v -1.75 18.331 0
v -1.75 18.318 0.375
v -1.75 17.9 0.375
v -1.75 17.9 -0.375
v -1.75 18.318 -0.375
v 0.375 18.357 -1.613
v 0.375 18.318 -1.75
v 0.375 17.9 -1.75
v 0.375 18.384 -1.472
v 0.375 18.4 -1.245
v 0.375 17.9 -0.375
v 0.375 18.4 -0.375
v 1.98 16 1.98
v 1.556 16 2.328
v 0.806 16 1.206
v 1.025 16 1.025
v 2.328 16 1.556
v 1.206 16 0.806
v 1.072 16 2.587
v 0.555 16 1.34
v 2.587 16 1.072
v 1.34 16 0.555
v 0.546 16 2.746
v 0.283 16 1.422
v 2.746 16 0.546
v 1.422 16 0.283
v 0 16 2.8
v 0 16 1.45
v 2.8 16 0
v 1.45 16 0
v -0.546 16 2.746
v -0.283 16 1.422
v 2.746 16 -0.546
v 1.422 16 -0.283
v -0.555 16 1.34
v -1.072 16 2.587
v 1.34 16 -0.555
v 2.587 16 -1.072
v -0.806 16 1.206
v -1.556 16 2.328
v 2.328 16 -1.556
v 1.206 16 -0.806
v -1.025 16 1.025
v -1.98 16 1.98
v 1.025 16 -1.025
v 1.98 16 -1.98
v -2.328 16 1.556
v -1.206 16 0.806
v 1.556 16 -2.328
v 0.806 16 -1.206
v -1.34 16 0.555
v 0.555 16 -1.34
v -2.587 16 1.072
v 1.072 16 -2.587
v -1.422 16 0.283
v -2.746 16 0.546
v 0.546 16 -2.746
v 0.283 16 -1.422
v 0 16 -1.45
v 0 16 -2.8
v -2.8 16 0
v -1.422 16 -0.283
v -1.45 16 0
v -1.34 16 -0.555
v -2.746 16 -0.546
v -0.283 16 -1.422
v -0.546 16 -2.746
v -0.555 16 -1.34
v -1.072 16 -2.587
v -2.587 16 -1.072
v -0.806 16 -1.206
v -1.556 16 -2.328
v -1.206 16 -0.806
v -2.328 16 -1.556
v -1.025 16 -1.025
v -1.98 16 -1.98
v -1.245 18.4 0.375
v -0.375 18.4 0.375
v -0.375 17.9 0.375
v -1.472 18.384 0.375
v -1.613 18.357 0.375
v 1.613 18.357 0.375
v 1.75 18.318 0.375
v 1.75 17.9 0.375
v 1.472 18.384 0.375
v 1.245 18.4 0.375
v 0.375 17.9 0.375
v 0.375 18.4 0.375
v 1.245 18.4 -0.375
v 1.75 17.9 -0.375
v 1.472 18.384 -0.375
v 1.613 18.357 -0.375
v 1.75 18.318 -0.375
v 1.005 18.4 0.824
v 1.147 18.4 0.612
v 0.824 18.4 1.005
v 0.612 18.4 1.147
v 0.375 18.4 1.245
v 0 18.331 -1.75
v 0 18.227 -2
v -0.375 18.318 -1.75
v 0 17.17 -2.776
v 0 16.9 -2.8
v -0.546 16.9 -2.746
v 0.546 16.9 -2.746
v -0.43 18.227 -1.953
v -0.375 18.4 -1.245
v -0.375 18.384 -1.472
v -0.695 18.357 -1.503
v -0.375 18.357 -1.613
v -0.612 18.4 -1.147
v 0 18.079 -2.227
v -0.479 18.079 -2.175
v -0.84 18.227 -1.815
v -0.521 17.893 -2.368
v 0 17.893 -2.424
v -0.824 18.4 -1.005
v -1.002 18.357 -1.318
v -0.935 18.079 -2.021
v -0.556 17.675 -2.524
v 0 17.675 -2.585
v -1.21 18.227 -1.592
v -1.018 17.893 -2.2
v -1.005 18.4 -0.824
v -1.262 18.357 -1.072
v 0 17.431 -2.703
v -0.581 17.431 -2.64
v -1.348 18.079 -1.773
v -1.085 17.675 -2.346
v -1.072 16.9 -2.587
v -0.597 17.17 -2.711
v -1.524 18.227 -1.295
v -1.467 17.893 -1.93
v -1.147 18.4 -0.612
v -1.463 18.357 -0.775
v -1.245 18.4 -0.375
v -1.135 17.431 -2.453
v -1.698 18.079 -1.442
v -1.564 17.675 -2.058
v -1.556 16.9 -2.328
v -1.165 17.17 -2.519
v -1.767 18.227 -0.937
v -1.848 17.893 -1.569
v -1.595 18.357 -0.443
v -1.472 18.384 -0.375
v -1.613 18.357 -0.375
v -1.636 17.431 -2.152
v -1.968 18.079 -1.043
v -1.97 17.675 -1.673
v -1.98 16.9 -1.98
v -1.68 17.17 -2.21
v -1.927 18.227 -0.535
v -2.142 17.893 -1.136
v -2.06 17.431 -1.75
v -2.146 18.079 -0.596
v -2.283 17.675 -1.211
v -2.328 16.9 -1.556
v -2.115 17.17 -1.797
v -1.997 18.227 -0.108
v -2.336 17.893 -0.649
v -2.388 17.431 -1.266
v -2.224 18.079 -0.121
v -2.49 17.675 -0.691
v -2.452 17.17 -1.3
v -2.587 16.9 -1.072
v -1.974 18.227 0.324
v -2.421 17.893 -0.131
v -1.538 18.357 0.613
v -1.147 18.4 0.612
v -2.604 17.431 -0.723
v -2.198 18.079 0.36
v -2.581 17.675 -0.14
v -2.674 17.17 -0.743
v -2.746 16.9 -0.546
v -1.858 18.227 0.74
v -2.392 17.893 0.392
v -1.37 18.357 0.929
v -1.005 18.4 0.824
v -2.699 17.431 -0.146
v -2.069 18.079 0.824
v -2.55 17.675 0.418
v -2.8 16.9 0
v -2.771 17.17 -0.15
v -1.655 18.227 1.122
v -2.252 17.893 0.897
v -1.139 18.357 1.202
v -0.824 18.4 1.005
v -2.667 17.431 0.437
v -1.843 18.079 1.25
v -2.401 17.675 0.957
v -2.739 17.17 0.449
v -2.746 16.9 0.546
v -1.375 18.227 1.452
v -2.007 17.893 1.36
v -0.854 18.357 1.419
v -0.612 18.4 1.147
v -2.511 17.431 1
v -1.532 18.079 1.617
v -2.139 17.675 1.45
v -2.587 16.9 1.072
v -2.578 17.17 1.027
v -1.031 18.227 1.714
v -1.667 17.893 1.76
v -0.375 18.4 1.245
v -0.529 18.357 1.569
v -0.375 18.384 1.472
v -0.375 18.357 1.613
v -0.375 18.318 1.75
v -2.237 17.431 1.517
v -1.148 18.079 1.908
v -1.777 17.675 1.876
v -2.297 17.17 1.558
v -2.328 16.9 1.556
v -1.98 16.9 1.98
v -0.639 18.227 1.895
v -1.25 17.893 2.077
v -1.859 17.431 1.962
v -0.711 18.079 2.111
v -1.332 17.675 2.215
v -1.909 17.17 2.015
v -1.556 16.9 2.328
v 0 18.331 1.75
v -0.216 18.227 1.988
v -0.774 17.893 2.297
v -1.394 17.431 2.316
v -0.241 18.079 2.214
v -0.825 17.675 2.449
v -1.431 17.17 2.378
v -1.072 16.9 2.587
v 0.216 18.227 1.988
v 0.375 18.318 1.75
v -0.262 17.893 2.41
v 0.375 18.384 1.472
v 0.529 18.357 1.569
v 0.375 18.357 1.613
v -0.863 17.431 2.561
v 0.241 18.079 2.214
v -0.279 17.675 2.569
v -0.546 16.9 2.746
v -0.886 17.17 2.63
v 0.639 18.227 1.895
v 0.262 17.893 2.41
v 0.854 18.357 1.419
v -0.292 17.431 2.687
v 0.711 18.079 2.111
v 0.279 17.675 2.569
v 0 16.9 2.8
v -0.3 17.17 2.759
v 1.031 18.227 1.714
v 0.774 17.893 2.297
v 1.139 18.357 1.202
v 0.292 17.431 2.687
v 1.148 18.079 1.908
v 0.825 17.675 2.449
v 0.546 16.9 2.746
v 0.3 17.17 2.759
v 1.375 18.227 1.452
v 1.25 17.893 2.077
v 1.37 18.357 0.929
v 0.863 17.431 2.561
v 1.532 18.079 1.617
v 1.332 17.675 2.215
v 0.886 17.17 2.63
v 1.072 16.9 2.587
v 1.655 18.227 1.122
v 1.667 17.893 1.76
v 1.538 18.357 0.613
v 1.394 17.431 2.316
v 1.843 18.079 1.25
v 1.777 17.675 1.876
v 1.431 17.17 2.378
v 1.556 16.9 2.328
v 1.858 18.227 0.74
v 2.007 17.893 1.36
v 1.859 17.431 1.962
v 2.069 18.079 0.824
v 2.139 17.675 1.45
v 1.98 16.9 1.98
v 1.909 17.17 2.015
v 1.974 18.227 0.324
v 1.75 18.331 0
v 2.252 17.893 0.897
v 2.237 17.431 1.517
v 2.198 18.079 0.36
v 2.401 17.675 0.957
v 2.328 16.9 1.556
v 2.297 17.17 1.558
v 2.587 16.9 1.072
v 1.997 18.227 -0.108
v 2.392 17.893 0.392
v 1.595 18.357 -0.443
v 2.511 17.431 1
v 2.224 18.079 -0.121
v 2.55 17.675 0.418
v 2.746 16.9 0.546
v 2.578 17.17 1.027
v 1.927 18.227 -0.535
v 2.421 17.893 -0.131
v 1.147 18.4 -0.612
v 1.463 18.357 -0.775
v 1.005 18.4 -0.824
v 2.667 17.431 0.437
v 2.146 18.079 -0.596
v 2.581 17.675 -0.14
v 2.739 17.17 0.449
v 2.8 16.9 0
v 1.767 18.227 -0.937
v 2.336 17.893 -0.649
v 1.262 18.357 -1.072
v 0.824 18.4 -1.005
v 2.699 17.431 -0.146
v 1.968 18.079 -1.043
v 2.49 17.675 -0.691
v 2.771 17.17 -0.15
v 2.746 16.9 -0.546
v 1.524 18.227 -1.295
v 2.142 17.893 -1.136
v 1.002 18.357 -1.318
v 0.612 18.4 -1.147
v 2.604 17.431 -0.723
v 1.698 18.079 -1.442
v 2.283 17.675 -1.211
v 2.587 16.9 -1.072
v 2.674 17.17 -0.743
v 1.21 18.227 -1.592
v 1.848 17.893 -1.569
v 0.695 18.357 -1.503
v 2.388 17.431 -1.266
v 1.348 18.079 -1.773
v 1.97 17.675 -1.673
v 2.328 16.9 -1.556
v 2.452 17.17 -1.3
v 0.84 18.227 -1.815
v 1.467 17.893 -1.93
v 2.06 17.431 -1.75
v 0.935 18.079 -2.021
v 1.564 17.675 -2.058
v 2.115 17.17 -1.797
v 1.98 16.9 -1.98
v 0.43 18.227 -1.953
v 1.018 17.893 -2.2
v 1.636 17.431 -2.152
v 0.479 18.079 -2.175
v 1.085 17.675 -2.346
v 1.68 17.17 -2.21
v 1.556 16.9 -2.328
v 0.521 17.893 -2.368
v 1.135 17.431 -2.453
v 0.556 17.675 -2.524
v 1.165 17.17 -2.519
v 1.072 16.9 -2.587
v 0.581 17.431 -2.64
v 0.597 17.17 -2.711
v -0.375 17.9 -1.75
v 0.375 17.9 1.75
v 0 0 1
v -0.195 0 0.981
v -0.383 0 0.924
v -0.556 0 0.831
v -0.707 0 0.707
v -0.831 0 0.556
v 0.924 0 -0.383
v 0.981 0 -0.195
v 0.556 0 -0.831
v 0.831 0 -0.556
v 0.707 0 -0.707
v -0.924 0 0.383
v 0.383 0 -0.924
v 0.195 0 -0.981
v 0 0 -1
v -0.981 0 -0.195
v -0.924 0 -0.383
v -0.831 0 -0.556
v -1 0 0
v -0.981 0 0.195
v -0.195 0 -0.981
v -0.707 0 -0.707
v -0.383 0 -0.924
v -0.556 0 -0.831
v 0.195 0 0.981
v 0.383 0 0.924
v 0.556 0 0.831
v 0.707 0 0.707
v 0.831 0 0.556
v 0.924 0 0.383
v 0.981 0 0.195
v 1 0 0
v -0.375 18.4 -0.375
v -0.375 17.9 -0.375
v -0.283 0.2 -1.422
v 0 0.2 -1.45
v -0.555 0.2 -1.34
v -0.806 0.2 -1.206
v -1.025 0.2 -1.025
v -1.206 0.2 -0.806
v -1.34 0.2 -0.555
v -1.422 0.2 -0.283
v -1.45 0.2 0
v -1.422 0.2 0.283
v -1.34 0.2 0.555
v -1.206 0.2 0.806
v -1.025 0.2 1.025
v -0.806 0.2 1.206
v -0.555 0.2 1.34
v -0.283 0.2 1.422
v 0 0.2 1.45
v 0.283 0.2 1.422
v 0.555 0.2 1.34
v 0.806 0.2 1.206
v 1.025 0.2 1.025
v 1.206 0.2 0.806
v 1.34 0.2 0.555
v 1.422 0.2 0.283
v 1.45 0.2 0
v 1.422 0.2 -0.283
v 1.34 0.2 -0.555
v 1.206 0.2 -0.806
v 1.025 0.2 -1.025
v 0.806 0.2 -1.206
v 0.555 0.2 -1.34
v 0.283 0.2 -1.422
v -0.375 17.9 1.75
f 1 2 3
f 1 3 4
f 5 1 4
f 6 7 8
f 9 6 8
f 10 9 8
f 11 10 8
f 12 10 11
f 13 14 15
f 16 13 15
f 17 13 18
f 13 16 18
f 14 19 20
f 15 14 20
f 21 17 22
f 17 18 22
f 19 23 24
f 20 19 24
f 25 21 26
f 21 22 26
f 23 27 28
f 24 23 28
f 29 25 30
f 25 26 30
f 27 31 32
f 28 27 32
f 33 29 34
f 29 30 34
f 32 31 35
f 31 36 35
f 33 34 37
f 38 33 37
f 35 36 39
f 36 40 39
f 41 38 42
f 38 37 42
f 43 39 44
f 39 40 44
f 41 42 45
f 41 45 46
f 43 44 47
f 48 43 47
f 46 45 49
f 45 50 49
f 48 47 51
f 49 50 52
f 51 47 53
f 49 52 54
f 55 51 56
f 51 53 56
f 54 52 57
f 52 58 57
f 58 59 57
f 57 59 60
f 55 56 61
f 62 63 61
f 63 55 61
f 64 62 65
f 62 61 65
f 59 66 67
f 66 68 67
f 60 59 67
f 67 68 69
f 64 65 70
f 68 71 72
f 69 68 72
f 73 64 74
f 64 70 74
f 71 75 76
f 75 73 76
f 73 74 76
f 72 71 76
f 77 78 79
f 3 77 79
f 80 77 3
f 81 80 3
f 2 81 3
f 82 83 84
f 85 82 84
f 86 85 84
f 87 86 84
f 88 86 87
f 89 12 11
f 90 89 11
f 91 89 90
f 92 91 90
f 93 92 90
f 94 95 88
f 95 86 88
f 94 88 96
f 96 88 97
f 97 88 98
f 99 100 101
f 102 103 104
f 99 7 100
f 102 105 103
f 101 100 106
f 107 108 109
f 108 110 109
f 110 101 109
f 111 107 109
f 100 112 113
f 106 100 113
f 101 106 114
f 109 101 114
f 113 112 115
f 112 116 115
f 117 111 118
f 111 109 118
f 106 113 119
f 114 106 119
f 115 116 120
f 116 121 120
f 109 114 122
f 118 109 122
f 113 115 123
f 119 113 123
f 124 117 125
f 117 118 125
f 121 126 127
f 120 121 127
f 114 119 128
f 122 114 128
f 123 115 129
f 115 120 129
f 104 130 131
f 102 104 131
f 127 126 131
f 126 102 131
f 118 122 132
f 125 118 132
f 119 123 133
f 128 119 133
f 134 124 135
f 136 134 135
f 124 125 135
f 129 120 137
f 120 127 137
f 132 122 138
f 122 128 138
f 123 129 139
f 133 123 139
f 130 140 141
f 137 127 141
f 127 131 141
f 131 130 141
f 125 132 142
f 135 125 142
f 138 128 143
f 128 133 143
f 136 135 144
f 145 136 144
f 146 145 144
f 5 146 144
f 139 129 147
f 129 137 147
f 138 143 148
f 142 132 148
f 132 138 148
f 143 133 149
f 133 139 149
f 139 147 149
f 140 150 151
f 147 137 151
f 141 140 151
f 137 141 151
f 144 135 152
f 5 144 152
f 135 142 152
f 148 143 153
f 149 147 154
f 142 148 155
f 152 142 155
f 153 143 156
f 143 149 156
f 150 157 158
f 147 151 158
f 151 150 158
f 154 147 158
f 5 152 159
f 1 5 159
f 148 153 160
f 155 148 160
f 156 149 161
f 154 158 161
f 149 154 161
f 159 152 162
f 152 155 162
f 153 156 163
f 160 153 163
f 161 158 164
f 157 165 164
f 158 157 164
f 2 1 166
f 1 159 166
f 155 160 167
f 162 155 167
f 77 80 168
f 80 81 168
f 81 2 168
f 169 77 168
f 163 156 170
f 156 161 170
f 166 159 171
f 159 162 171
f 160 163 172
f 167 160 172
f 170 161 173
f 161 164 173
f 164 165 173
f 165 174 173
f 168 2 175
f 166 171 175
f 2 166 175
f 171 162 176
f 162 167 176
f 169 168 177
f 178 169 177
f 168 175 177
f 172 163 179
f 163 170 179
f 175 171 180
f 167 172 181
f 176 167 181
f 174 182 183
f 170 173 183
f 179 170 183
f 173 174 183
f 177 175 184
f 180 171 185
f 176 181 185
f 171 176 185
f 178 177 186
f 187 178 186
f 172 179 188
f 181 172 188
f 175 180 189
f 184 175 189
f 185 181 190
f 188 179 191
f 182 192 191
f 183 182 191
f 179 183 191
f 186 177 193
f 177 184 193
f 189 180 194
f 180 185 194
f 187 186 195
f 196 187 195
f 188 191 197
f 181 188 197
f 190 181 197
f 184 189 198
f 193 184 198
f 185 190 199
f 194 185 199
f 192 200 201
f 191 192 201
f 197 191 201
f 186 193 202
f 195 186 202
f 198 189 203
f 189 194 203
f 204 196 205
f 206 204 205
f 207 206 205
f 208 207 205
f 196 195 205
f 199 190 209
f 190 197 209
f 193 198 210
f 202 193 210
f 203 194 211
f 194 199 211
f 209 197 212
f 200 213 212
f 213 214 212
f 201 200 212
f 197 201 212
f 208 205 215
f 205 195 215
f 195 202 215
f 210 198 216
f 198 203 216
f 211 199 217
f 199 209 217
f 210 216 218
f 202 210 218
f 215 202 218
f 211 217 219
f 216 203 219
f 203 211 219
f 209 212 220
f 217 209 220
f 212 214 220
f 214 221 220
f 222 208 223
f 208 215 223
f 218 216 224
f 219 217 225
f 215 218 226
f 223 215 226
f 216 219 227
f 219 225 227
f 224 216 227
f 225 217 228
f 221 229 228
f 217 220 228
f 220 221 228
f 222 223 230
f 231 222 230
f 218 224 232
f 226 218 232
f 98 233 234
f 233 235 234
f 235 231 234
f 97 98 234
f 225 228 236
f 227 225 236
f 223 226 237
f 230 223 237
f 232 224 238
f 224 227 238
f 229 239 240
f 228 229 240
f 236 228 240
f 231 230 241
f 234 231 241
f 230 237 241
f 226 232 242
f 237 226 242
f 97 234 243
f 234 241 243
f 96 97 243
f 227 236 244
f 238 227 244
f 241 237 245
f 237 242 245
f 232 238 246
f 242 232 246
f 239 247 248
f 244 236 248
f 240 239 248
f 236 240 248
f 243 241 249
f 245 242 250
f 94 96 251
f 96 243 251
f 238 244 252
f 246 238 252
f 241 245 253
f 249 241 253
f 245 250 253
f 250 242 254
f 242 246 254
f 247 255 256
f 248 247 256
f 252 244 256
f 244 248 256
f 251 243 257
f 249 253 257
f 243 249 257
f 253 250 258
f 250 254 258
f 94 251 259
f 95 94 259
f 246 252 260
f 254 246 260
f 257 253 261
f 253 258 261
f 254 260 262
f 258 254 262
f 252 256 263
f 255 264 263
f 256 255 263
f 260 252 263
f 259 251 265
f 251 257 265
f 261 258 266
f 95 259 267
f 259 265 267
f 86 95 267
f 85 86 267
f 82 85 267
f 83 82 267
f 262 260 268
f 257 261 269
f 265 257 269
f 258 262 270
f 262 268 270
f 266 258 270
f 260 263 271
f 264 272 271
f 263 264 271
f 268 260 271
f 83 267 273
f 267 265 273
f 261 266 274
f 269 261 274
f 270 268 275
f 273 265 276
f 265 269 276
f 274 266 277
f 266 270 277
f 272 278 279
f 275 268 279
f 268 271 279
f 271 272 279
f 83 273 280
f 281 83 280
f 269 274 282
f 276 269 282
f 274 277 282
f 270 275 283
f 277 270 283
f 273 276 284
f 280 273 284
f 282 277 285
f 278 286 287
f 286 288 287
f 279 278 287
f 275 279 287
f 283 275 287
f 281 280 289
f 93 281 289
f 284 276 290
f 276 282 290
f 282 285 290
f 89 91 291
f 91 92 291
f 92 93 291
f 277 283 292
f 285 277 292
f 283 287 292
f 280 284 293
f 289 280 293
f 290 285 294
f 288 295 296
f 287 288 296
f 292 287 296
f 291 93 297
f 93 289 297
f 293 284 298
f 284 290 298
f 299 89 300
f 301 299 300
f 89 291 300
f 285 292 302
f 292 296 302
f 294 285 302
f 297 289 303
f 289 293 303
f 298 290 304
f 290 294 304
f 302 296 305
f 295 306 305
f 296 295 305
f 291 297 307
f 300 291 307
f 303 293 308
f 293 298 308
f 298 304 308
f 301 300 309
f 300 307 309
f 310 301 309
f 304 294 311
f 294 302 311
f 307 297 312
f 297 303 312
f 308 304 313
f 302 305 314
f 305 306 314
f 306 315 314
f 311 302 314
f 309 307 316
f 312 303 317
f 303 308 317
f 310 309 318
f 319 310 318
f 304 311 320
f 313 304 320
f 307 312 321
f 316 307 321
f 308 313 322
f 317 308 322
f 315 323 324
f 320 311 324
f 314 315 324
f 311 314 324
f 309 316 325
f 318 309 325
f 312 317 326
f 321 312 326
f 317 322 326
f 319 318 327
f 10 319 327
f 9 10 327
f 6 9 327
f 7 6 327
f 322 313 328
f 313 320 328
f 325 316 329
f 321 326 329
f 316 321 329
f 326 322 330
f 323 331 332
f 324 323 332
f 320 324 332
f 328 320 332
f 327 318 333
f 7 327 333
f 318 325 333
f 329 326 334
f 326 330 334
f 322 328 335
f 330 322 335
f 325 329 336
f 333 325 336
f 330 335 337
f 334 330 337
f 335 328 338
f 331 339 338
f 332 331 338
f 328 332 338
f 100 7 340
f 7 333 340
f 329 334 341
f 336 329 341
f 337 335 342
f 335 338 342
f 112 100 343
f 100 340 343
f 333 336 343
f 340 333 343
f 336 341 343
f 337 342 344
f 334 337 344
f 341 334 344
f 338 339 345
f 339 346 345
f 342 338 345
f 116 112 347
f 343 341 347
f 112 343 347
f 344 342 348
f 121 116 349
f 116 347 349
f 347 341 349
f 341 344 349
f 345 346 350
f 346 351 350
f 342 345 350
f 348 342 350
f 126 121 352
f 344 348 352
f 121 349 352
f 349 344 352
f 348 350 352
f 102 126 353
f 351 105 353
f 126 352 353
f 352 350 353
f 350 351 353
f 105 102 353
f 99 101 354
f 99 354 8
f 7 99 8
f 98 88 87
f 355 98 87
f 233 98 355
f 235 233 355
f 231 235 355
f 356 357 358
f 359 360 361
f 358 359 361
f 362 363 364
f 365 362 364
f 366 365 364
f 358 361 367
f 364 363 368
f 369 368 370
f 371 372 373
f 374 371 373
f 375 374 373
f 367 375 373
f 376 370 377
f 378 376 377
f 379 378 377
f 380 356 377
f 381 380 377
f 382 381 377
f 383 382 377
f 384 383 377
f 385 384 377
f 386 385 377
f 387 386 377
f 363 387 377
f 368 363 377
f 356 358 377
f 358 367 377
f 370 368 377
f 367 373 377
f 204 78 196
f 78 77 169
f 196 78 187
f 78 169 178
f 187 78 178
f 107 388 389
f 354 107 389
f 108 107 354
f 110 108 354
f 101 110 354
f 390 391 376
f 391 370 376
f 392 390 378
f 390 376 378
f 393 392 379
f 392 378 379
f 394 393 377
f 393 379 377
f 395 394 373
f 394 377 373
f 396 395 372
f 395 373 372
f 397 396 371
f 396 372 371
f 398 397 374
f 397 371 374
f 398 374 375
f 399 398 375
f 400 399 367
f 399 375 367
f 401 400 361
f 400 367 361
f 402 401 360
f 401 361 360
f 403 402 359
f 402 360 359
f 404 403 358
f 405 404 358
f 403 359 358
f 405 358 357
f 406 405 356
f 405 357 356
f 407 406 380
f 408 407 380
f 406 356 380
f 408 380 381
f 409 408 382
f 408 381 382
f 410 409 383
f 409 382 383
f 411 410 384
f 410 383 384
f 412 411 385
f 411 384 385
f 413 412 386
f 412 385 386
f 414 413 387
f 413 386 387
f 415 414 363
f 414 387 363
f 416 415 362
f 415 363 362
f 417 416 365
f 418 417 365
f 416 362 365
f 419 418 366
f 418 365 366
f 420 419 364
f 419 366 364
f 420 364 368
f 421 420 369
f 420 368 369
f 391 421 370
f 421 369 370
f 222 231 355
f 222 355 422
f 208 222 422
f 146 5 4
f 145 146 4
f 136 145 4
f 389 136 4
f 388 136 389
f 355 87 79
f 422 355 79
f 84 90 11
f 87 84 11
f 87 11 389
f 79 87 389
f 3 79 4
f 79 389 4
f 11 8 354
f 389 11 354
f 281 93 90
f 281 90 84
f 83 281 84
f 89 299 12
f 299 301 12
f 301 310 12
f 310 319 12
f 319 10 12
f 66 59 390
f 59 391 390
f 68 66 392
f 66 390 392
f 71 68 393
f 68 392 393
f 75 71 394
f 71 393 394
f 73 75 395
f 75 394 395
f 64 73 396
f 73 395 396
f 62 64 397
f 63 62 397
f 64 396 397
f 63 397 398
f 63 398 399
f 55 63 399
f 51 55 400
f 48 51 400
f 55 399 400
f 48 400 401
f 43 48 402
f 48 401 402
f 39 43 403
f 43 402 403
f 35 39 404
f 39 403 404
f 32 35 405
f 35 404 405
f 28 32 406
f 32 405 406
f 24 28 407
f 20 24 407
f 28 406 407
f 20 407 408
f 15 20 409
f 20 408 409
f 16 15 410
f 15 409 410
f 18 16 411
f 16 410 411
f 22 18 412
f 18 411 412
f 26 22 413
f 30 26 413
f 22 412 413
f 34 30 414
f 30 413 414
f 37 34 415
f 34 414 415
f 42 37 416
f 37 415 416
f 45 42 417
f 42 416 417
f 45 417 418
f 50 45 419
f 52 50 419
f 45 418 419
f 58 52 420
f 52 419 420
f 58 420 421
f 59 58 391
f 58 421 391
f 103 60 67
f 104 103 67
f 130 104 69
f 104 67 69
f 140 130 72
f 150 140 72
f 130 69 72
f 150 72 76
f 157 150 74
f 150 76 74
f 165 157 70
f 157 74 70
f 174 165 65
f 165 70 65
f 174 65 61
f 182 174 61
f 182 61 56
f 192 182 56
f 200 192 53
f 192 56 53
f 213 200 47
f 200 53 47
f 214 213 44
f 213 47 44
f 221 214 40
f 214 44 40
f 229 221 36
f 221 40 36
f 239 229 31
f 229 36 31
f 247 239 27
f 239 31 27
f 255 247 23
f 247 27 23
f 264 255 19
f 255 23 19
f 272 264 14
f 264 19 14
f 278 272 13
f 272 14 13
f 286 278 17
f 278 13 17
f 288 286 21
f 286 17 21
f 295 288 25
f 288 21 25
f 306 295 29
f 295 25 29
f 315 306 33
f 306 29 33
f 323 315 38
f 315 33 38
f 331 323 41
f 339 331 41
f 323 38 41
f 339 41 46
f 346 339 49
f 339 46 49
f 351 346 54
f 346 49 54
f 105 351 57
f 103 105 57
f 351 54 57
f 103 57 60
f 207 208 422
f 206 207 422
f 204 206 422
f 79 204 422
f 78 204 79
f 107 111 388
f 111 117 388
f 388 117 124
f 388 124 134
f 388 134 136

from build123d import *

# Parameters (mm, degrees)
FILLET1_R          = 1.5
CUT_EXTRUDE1_DEPTH = 0.5


with BuildPart() as part:
    # Sketch1 → Revolve1 (revolve)
    with BuildSketch(Plane.XY, mode=Mode.PRIVATE) as revolve1_sk:
        Polygon((0, 18.4), (2.8, 18.4), (2.8, 16), (1.45, 16), (1.45, 0.2), (1, 0), (0, 0), align=None)
    revolve(revolve1_sk.sketch.rotate(Axis((0, 0, 0), (0, 1, 0)), 90), axis=Axis((0, 0, 0), (0, 1, 0)))

    # Fillet1
    fillet1_edges = [part.edges().sort_by_distance(p)[0] for p in [
        (0, 18.4, 2.8),
    ]]
    fillet(fillet1_edges, radius=FILLET1_R)

    # Sketch2 → Cut-Extrude1 (cut)
    with BuildSketch(Plane(origin=(0, 18.4, 0), x_dir=(1, 0, 0), z_dir=(0, 1, 0))):
        Polygon((1.75, 0.375), (1.75, -0.375), (0.375, -0.375), (0.375, -1.75), (-0.375, -1.75), (-0.375, -0.375), (-1.75, -0.375), (-1.75, 0.375), (-0.375, 0.375), (-0.375, 1.75), (0.375, 1.75), (0.375, 0.375), align=None)
    extrude(amount=-CUT_EXTRUDE1_DEPTH, mode=Mode.SUBTRACT)


solid = part.part
